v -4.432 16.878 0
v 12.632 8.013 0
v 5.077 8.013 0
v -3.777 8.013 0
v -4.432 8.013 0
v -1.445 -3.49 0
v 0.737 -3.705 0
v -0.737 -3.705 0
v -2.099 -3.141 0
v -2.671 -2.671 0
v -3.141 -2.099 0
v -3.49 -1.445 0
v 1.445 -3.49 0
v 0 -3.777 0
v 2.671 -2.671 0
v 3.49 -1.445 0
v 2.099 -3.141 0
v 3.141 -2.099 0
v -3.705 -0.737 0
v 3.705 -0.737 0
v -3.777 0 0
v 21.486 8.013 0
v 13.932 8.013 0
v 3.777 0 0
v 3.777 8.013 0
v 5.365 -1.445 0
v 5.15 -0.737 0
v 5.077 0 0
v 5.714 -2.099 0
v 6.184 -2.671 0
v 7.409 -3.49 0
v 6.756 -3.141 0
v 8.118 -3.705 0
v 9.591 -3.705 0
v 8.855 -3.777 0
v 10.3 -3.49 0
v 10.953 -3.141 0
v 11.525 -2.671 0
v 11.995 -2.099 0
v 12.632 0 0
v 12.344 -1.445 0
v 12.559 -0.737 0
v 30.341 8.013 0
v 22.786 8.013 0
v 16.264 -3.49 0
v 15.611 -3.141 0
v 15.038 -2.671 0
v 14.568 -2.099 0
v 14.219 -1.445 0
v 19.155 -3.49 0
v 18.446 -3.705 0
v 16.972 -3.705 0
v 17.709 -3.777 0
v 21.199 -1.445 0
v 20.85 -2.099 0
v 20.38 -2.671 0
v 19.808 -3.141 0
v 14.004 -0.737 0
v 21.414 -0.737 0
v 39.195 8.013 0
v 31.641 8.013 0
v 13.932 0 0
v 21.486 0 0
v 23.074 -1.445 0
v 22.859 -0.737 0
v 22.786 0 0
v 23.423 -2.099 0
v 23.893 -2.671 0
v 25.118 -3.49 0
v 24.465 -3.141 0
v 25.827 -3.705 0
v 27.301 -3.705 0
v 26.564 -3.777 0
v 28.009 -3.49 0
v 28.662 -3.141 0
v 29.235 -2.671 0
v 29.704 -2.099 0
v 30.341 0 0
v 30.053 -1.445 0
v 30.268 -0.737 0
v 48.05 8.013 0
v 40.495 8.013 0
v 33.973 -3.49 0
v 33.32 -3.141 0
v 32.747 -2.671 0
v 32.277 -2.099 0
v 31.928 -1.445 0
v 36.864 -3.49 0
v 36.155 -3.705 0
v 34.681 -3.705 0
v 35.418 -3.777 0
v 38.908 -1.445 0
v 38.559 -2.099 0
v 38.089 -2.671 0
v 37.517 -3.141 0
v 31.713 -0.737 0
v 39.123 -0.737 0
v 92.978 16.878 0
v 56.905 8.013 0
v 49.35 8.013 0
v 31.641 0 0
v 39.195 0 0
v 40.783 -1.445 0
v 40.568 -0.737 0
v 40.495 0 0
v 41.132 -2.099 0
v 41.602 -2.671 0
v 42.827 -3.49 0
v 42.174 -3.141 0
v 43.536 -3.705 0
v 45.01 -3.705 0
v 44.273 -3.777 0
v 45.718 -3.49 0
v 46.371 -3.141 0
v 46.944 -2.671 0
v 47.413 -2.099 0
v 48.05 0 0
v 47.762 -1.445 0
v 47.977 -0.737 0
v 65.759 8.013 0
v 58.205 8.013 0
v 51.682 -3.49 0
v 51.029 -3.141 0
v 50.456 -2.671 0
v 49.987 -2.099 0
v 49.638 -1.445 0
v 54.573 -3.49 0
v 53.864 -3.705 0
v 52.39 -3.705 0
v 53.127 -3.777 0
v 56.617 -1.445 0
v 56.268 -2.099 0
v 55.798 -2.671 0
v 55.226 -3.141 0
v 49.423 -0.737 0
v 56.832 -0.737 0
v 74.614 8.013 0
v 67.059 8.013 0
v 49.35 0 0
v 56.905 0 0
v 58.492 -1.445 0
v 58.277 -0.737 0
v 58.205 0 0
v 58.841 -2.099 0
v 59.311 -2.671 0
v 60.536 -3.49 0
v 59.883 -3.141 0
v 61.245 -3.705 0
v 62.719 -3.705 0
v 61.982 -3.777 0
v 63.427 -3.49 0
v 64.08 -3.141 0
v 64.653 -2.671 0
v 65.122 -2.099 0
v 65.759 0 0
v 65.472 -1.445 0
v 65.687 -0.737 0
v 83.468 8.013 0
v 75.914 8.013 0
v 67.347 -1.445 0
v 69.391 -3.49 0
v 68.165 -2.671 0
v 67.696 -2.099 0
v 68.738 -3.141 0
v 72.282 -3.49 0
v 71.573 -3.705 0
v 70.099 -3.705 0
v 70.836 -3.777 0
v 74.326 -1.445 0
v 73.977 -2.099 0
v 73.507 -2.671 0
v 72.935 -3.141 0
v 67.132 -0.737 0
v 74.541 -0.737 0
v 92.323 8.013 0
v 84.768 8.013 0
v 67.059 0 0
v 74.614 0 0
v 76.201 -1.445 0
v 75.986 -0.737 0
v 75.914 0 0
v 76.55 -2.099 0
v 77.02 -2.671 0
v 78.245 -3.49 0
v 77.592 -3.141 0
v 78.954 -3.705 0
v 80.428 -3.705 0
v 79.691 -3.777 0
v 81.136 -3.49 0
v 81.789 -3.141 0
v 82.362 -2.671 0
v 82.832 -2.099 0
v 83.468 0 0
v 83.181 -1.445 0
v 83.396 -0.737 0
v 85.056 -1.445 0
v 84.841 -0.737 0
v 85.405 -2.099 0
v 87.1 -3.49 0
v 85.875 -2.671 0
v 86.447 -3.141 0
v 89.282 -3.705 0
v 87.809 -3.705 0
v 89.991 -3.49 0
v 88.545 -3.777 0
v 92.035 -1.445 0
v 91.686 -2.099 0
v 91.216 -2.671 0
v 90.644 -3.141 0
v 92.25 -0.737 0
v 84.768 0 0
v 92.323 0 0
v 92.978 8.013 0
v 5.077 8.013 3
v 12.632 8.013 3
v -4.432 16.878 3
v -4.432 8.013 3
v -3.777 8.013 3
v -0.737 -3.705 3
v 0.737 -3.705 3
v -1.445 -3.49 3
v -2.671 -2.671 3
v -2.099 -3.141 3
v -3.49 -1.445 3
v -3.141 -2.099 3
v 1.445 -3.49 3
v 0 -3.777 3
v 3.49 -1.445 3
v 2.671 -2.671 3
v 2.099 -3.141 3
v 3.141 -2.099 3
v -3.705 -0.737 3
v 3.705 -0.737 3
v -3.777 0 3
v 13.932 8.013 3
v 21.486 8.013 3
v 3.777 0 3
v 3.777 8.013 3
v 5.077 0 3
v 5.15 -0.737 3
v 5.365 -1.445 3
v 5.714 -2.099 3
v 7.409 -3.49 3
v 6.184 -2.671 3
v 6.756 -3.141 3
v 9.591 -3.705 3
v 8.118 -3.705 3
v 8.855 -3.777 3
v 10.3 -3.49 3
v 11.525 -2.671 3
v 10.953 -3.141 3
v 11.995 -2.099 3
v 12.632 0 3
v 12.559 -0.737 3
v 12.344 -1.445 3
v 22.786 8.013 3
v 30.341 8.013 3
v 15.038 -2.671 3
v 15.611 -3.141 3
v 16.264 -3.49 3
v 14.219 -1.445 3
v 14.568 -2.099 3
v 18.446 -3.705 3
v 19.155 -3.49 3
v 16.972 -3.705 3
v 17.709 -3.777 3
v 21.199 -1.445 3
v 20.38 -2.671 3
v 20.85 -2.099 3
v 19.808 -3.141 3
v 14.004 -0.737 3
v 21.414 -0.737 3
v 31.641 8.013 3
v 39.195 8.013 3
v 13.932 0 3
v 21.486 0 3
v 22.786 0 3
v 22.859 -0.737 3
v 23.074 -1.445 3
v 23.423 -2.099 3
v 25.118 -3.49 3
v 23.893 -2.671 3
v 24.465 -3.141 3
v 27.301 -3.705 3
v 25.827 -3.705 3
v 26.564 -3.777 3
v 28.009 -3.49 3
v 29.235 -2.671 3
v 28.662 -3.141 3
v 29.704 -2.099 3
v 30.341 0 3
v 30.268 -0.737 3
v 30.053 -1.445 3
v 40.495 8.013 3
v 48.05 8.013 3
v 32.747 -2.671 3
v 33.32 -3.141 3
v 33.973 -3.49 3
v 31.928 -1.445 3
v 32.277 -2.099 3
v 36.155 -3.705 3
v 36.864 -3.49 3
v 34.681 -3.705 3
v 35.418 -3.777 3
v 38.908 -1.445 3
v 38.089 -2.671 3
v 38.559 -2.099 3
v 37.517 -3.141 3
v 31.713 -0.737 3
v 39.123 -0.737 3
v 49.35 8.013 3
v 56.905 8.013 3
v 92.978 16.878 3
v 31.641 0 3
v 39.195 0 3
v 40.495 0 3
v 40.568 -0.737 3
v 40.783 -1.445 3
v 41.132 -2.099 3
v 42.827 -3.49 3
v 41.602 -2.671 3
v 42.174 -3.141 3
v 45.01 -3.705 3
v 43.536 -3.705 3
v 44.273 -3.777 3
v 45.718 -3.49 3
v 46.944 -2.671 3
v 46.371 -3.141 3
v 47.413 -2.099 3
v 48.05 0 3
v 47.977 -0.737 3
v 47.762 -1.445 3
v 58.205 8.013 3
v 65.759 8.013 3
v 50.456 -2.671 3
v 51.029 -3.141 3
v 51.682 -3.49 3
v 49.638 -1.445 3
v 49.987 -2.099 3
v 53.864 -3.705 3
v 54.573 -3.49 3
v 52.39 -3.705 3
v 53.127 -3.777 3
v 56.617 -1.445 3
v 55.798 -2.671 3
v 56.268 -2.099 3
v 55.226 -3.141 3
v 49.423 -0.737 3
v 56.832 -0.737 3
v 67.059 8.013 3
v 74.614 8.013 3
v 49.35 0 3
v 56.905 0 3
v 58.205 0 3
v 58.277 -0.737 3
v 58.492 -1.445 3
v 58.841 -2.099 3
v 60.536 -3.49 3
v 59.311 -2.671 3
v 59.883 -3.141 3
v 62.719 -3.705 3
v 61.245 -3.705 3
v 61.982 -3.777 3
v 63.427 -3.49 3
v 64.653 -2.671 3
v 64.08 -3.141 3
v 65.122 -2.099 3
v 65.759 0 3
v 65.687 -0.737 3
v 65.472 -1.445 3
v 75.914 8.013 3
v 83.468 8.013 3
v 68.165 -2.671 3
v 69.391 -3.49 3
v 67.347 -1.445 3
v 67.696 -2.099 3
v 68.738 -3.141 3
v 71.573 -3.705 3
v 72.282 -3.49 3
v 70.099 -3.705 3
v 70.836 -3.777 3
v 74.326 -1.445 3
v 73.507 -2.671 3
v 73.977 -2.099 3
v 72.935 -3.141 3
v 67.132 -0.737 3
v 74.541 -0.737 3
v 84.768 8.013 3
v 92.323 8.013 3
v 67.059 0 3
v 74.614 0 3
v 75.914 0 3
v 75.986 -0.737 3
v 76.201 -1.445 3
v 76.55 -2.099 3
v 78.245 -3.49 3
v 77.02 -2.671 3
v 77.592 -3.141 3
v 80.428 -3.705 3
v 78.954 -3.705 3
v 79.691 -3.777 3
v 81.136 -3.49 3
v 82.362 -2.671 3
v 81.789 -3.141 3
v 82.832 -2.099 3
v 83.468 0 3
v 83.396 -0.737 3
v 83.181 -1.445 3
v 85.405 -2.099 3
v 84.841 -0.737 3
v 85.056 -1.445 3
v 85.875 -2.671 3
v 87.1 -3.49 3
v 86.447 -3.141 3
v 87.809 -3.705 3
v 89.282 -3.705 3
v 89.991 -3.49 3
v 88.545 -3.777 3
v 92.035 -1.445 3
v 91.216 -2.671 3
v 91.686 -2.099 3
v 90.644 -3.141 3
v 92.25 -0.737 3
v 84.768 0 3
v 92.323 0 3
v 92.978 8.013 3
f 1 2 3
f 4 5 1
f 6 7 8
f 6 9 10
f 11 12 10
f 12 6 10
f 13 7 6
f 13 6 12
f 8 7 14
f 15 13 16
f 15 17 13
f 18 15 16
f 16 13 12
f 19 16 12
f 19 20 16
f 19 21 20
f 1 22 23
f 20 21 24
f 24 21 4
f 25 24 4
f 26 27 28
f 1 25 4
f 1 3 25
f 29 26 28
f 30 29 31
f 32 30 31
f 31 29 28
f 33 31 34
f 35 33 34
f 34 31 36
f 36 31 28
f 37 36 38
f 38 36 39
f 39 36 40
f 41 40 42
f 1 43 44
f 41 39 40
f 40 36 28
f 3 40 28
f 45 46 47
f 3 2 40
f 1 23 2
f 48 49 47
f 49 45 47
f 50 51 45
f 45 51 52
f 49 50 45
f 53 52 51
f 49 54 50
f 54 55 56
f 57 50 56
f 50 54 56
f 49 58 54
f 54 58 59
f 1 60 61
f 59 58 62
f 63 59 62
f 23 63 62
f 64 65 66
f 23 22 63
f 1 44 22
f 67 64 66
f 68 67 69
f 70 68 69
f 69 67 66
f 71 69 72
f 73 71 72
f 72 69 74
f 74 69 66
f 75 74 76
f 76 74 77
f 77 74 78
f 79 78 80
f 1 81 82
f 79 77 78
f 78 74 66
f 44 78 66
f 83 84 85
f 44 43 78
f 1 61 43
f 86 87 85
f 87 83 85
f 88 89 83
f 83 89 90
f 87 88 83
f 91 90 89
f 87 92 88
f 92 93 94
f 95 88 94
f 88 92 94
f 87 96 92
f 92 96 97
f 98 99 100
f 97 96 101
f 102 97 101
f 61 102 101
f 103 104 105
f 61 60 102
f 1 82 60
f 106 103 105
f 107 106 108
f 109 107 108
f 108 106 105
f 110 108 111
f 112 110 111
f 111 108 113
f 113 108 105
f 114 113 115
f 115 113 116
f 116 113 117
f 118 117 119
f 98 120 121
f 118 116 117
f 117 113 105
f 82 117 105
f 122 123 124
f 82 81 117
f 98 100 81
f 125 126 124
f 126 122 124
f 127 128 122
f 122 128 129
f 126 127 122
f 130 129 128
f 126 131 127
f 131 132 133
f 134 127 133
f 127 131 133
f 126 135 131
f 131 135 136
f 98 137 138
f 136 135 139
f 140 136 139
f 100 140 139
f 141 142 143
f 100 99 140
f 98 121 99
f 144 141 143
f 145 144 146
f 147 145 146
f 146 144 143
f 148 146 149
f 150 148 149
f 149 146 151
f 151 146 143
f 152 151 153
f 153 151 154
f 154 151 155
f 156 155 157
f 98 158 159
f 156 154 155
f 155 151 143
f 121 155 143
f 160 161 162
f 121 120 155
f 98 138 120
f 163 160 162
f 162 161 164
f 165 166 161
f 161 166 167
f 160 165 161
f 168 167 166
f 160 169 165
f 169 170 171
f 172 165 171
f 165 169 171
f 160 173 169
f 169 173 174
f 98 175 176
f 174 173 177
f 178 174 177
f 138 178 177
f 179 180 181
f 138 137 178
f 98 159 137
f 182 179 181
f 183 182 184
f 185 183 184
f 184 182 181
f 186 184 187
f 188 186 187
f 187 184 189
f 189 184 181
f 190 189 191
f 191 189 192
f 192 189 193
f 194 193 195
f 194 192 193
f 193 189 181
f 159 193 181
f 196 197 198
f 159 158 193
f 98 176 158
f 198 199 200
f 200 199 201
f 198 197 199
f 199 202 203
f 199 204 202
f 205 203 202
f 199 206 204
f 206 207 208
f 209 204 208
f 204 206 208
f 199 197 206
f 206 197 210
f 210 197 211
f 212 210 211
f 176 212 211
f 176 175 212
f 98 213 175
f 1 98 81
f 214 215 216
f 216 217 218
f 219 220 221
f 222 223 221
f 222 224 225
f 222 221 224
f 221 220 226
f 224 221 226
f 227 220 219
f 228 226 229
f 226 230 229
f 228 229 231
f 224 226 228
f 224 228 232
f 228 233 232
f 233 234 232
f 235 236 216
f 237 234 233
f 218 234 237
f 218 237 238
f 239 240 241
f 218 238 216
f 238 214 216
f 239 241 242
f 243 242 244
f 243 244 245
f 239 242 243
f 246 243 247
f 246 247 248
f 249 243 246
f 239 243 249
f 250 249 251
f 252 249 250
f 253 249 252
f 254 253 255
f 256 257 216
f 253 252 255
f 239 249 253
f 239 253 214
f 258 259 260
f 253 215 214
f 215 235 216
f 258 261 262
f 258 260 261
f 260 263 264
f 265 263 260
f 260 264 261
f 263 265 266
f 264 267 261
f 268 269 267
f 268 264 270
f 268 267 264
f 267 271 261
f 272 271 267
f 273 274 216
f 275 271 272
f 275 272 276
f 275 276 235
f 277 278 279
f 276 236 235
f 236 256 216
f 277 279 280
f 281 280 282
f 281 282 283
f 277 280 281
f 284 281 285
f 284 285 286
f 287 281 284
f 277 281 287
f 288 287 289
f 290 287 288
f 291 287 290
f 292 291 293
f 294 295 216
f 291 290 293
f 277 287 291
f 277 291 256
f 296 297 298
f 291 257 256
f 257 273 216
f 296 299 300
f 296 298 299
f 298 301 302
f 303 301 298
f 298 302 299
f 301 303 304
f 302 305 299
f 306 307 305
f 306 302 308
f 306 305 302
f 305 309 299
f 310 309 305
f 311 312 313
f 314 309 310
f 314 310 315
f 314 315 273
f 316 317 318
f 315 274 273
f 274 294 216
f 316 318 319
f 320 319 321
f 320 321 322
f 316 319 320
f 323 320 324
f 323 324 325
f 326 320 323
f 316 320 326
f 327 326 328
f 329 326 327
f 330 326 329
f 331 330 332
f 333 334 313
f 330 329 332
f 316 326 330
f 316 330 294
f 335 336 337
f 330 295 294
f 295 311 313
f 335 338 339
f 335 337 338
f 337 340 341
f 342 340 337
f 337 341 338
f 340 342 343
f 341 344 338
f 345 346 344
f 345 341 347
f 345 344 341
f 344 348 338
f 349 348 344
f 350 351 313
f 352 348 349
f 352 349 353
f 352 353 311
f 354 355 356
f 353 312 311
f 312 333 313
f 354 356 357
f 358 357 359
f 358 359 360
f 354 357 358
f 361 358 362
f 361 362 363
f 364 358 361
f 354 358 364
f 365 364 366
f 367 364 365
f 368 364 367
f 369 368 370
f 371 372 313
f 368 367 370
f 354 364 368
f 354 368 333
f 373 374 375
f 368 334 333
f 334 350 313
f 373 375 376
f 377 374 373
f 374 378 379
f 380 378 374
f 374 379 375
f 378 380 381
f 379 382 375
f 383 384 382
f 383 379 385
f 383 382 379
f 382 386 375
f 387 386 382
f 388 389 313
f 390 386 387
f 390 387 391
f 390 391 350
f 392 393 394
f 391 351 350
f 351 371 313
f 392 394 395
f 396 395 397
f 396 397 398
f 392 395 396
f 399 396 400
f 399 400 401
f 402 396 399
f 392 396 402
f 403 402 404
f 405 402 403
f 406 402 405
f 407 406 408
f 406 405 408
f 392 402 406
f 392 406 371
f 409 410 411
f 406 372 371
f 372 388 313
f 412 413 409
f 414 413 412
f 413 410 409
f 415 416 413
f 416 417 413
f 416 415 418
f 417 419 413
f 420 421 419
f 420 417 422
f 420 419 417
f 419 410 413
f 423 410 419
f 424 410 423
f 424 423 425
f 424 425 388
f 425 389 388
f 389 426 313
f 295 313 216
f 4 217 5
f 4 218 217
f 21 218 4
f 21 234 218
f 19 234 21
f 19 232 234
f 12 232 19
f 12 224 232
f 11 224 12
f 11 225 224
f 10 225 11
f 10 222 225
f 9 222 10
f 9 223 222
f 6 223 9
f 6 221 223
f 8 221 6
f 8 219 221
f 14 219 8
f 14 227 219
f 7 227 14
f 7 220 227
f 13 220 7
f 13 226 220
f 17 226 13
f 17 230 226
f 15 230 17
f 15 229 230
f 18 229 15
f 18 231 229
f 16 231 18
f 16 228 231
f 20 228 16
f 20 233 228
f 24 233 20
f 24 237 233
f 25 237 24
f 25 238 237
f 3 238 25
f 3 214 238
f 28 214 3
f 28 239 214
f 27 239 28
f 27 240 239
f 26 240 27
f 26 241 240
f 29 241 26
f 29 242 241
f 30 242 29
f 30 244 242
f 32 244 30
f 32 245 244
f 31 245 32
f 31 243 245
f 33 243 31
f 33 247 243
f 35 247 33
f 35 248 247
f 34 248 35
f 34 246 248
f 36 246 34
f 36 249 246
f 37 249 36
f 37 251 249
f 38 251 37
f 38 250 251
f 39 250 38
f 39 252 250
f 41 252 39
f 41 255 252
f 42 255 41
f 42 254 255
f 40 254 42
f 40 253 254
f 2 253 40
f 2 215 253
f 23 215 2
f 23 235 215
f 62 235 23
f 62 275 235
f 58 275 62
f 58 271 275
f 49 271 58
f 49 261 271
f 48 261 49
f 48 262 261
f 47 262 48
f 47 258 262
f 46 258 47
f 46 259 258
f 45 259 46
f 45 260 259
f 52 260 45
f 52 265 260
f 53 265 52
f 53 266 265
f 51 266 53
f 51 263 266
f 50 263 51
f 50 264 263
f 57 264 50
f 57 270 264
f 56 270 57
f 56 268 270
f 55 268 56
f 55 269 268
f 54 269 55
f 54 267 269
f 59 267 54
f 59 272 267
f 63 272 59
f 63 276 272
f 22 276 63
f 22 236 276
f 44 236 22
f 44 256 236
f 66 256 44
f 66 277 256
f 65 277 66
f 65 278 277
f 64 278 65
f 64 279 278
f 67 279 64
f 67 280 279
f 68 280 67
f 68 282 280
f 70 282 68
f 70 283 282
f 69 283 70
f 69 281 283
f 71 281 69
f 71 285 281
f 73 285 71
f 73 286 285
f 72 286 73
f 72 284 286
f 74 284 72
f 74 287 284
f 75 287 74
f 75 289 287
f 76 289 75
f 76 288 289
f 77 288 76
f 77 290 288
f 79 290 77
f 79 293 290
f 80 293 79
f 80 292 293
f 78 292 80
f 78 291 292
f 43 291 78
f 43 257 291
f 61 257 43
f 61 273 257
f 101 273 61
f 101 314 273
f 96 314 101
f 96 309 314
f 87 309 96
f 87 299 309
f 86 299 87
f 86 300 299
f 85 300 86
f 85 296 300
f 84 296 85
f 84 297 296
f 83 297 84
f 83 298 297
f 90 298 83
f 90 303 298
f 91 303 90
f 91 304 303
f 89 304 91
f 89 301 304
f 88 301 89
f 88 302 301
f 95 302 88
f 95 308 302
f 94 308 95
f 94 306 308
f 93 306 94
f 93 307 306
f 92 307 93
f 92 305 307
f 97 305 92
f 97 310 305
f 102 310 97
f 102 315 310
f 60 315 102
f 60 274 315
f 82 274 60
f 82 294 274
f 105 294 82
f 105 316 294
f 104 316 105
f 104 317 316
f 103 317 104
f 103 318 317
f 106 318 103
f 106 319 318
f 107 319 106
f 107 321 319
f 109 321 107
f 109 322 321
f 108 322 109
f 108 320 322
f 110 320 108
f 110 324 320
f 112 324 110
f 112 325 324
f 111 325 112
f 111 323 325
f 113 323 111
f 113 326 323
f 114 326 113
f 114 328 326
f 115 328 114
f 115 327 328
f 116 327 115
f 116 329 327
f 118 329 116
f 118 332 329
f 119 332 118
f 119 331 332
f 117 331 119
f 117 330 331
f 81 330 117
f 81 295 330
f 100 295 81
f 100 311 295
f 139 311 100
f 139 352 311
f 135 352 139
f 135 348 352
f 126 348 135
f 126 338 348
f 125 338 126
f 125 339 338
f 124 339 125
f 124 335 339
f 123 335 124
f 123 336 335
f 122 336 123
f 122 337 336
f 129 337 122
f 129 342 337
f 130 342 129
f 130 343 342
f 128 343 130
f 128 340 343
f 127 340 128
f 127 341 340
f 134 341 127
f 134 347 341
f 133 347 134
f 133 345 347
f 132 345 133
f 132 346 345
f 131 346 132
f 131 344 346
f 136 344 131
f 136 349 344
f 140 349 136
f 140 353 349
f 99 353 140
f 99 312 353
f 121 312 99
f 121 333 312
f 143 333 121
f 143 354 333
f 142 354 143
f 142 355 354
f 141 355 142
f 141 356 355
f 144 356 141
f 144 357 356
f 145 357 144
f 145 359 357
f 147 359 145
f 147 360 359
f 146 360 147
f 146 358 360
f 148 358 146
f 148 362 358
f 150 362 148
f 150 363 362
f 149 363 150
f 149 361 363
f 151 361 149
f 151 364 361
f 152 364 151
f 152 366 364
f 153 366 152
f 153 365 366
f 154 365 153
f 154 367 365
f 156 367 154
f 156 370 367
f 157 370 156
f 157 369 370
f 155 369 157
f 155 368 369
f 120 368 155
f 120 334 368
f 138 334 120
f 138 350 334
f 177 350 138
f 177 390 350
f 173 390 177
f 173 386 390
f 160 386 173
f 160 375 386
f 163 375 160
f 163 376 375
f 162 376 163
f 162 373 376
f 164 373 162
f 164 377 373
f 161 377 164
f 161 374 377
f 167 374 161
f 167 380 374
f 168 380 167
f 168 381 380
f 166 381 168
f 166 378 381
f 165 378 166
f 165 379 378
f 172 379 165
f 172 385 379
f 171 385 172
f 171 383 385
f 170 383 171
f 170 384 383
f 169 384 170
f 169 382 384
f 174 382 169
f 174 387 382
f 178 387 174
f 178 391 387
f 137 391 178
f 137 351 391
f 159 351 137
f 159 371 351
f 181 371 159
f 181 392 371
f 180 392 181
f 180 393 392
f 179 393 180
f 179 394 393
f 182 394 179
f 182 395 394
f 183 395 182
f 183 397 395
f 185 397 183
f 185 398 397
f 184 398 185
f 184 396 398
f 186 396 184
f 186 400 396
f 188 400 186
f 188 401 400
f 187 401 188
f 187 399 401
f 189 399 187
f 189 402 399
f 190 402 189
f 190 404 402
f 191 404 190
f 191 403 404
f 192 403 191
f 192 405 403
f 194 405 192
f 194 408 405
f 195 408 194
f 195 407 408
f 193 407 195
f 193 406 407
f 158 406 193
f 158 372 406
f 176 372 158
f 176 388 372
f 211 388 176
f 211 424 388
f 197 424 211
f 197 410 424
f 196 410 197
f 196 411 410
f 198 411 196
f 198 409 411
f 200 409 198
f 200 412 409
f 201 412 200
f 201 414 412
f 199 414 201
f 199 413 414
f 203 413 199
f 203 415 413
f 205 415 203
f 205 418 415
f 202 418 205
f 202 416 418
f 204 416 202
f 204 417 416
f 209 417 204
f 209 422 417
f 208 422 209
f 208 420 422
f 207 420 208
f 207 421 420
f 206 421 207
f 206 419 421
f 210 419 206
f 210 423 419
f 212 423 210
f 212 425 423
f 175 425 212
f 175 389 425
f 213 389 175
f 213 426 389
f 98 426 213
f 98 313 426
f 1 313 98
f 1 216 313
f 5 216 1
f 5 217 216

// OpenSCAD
width = 97.4;
strings = 12;
stringHole = 1.3;
length = 20;

thickness = 3;

spacing = width / (strings-1);
d = spacing-stringHole;

linear_extrude(height=thickness) {
    for (i=[0:strings-2]) {
        hull() {
            translate([i*spacing,0]) circle(d=d,$fn=32);
            translate([i*spacing,length-d]) square(d,center=true);
        }
        translate([i*spacing,length-d]) square(spacing+0.01,center=true);
    }
}
